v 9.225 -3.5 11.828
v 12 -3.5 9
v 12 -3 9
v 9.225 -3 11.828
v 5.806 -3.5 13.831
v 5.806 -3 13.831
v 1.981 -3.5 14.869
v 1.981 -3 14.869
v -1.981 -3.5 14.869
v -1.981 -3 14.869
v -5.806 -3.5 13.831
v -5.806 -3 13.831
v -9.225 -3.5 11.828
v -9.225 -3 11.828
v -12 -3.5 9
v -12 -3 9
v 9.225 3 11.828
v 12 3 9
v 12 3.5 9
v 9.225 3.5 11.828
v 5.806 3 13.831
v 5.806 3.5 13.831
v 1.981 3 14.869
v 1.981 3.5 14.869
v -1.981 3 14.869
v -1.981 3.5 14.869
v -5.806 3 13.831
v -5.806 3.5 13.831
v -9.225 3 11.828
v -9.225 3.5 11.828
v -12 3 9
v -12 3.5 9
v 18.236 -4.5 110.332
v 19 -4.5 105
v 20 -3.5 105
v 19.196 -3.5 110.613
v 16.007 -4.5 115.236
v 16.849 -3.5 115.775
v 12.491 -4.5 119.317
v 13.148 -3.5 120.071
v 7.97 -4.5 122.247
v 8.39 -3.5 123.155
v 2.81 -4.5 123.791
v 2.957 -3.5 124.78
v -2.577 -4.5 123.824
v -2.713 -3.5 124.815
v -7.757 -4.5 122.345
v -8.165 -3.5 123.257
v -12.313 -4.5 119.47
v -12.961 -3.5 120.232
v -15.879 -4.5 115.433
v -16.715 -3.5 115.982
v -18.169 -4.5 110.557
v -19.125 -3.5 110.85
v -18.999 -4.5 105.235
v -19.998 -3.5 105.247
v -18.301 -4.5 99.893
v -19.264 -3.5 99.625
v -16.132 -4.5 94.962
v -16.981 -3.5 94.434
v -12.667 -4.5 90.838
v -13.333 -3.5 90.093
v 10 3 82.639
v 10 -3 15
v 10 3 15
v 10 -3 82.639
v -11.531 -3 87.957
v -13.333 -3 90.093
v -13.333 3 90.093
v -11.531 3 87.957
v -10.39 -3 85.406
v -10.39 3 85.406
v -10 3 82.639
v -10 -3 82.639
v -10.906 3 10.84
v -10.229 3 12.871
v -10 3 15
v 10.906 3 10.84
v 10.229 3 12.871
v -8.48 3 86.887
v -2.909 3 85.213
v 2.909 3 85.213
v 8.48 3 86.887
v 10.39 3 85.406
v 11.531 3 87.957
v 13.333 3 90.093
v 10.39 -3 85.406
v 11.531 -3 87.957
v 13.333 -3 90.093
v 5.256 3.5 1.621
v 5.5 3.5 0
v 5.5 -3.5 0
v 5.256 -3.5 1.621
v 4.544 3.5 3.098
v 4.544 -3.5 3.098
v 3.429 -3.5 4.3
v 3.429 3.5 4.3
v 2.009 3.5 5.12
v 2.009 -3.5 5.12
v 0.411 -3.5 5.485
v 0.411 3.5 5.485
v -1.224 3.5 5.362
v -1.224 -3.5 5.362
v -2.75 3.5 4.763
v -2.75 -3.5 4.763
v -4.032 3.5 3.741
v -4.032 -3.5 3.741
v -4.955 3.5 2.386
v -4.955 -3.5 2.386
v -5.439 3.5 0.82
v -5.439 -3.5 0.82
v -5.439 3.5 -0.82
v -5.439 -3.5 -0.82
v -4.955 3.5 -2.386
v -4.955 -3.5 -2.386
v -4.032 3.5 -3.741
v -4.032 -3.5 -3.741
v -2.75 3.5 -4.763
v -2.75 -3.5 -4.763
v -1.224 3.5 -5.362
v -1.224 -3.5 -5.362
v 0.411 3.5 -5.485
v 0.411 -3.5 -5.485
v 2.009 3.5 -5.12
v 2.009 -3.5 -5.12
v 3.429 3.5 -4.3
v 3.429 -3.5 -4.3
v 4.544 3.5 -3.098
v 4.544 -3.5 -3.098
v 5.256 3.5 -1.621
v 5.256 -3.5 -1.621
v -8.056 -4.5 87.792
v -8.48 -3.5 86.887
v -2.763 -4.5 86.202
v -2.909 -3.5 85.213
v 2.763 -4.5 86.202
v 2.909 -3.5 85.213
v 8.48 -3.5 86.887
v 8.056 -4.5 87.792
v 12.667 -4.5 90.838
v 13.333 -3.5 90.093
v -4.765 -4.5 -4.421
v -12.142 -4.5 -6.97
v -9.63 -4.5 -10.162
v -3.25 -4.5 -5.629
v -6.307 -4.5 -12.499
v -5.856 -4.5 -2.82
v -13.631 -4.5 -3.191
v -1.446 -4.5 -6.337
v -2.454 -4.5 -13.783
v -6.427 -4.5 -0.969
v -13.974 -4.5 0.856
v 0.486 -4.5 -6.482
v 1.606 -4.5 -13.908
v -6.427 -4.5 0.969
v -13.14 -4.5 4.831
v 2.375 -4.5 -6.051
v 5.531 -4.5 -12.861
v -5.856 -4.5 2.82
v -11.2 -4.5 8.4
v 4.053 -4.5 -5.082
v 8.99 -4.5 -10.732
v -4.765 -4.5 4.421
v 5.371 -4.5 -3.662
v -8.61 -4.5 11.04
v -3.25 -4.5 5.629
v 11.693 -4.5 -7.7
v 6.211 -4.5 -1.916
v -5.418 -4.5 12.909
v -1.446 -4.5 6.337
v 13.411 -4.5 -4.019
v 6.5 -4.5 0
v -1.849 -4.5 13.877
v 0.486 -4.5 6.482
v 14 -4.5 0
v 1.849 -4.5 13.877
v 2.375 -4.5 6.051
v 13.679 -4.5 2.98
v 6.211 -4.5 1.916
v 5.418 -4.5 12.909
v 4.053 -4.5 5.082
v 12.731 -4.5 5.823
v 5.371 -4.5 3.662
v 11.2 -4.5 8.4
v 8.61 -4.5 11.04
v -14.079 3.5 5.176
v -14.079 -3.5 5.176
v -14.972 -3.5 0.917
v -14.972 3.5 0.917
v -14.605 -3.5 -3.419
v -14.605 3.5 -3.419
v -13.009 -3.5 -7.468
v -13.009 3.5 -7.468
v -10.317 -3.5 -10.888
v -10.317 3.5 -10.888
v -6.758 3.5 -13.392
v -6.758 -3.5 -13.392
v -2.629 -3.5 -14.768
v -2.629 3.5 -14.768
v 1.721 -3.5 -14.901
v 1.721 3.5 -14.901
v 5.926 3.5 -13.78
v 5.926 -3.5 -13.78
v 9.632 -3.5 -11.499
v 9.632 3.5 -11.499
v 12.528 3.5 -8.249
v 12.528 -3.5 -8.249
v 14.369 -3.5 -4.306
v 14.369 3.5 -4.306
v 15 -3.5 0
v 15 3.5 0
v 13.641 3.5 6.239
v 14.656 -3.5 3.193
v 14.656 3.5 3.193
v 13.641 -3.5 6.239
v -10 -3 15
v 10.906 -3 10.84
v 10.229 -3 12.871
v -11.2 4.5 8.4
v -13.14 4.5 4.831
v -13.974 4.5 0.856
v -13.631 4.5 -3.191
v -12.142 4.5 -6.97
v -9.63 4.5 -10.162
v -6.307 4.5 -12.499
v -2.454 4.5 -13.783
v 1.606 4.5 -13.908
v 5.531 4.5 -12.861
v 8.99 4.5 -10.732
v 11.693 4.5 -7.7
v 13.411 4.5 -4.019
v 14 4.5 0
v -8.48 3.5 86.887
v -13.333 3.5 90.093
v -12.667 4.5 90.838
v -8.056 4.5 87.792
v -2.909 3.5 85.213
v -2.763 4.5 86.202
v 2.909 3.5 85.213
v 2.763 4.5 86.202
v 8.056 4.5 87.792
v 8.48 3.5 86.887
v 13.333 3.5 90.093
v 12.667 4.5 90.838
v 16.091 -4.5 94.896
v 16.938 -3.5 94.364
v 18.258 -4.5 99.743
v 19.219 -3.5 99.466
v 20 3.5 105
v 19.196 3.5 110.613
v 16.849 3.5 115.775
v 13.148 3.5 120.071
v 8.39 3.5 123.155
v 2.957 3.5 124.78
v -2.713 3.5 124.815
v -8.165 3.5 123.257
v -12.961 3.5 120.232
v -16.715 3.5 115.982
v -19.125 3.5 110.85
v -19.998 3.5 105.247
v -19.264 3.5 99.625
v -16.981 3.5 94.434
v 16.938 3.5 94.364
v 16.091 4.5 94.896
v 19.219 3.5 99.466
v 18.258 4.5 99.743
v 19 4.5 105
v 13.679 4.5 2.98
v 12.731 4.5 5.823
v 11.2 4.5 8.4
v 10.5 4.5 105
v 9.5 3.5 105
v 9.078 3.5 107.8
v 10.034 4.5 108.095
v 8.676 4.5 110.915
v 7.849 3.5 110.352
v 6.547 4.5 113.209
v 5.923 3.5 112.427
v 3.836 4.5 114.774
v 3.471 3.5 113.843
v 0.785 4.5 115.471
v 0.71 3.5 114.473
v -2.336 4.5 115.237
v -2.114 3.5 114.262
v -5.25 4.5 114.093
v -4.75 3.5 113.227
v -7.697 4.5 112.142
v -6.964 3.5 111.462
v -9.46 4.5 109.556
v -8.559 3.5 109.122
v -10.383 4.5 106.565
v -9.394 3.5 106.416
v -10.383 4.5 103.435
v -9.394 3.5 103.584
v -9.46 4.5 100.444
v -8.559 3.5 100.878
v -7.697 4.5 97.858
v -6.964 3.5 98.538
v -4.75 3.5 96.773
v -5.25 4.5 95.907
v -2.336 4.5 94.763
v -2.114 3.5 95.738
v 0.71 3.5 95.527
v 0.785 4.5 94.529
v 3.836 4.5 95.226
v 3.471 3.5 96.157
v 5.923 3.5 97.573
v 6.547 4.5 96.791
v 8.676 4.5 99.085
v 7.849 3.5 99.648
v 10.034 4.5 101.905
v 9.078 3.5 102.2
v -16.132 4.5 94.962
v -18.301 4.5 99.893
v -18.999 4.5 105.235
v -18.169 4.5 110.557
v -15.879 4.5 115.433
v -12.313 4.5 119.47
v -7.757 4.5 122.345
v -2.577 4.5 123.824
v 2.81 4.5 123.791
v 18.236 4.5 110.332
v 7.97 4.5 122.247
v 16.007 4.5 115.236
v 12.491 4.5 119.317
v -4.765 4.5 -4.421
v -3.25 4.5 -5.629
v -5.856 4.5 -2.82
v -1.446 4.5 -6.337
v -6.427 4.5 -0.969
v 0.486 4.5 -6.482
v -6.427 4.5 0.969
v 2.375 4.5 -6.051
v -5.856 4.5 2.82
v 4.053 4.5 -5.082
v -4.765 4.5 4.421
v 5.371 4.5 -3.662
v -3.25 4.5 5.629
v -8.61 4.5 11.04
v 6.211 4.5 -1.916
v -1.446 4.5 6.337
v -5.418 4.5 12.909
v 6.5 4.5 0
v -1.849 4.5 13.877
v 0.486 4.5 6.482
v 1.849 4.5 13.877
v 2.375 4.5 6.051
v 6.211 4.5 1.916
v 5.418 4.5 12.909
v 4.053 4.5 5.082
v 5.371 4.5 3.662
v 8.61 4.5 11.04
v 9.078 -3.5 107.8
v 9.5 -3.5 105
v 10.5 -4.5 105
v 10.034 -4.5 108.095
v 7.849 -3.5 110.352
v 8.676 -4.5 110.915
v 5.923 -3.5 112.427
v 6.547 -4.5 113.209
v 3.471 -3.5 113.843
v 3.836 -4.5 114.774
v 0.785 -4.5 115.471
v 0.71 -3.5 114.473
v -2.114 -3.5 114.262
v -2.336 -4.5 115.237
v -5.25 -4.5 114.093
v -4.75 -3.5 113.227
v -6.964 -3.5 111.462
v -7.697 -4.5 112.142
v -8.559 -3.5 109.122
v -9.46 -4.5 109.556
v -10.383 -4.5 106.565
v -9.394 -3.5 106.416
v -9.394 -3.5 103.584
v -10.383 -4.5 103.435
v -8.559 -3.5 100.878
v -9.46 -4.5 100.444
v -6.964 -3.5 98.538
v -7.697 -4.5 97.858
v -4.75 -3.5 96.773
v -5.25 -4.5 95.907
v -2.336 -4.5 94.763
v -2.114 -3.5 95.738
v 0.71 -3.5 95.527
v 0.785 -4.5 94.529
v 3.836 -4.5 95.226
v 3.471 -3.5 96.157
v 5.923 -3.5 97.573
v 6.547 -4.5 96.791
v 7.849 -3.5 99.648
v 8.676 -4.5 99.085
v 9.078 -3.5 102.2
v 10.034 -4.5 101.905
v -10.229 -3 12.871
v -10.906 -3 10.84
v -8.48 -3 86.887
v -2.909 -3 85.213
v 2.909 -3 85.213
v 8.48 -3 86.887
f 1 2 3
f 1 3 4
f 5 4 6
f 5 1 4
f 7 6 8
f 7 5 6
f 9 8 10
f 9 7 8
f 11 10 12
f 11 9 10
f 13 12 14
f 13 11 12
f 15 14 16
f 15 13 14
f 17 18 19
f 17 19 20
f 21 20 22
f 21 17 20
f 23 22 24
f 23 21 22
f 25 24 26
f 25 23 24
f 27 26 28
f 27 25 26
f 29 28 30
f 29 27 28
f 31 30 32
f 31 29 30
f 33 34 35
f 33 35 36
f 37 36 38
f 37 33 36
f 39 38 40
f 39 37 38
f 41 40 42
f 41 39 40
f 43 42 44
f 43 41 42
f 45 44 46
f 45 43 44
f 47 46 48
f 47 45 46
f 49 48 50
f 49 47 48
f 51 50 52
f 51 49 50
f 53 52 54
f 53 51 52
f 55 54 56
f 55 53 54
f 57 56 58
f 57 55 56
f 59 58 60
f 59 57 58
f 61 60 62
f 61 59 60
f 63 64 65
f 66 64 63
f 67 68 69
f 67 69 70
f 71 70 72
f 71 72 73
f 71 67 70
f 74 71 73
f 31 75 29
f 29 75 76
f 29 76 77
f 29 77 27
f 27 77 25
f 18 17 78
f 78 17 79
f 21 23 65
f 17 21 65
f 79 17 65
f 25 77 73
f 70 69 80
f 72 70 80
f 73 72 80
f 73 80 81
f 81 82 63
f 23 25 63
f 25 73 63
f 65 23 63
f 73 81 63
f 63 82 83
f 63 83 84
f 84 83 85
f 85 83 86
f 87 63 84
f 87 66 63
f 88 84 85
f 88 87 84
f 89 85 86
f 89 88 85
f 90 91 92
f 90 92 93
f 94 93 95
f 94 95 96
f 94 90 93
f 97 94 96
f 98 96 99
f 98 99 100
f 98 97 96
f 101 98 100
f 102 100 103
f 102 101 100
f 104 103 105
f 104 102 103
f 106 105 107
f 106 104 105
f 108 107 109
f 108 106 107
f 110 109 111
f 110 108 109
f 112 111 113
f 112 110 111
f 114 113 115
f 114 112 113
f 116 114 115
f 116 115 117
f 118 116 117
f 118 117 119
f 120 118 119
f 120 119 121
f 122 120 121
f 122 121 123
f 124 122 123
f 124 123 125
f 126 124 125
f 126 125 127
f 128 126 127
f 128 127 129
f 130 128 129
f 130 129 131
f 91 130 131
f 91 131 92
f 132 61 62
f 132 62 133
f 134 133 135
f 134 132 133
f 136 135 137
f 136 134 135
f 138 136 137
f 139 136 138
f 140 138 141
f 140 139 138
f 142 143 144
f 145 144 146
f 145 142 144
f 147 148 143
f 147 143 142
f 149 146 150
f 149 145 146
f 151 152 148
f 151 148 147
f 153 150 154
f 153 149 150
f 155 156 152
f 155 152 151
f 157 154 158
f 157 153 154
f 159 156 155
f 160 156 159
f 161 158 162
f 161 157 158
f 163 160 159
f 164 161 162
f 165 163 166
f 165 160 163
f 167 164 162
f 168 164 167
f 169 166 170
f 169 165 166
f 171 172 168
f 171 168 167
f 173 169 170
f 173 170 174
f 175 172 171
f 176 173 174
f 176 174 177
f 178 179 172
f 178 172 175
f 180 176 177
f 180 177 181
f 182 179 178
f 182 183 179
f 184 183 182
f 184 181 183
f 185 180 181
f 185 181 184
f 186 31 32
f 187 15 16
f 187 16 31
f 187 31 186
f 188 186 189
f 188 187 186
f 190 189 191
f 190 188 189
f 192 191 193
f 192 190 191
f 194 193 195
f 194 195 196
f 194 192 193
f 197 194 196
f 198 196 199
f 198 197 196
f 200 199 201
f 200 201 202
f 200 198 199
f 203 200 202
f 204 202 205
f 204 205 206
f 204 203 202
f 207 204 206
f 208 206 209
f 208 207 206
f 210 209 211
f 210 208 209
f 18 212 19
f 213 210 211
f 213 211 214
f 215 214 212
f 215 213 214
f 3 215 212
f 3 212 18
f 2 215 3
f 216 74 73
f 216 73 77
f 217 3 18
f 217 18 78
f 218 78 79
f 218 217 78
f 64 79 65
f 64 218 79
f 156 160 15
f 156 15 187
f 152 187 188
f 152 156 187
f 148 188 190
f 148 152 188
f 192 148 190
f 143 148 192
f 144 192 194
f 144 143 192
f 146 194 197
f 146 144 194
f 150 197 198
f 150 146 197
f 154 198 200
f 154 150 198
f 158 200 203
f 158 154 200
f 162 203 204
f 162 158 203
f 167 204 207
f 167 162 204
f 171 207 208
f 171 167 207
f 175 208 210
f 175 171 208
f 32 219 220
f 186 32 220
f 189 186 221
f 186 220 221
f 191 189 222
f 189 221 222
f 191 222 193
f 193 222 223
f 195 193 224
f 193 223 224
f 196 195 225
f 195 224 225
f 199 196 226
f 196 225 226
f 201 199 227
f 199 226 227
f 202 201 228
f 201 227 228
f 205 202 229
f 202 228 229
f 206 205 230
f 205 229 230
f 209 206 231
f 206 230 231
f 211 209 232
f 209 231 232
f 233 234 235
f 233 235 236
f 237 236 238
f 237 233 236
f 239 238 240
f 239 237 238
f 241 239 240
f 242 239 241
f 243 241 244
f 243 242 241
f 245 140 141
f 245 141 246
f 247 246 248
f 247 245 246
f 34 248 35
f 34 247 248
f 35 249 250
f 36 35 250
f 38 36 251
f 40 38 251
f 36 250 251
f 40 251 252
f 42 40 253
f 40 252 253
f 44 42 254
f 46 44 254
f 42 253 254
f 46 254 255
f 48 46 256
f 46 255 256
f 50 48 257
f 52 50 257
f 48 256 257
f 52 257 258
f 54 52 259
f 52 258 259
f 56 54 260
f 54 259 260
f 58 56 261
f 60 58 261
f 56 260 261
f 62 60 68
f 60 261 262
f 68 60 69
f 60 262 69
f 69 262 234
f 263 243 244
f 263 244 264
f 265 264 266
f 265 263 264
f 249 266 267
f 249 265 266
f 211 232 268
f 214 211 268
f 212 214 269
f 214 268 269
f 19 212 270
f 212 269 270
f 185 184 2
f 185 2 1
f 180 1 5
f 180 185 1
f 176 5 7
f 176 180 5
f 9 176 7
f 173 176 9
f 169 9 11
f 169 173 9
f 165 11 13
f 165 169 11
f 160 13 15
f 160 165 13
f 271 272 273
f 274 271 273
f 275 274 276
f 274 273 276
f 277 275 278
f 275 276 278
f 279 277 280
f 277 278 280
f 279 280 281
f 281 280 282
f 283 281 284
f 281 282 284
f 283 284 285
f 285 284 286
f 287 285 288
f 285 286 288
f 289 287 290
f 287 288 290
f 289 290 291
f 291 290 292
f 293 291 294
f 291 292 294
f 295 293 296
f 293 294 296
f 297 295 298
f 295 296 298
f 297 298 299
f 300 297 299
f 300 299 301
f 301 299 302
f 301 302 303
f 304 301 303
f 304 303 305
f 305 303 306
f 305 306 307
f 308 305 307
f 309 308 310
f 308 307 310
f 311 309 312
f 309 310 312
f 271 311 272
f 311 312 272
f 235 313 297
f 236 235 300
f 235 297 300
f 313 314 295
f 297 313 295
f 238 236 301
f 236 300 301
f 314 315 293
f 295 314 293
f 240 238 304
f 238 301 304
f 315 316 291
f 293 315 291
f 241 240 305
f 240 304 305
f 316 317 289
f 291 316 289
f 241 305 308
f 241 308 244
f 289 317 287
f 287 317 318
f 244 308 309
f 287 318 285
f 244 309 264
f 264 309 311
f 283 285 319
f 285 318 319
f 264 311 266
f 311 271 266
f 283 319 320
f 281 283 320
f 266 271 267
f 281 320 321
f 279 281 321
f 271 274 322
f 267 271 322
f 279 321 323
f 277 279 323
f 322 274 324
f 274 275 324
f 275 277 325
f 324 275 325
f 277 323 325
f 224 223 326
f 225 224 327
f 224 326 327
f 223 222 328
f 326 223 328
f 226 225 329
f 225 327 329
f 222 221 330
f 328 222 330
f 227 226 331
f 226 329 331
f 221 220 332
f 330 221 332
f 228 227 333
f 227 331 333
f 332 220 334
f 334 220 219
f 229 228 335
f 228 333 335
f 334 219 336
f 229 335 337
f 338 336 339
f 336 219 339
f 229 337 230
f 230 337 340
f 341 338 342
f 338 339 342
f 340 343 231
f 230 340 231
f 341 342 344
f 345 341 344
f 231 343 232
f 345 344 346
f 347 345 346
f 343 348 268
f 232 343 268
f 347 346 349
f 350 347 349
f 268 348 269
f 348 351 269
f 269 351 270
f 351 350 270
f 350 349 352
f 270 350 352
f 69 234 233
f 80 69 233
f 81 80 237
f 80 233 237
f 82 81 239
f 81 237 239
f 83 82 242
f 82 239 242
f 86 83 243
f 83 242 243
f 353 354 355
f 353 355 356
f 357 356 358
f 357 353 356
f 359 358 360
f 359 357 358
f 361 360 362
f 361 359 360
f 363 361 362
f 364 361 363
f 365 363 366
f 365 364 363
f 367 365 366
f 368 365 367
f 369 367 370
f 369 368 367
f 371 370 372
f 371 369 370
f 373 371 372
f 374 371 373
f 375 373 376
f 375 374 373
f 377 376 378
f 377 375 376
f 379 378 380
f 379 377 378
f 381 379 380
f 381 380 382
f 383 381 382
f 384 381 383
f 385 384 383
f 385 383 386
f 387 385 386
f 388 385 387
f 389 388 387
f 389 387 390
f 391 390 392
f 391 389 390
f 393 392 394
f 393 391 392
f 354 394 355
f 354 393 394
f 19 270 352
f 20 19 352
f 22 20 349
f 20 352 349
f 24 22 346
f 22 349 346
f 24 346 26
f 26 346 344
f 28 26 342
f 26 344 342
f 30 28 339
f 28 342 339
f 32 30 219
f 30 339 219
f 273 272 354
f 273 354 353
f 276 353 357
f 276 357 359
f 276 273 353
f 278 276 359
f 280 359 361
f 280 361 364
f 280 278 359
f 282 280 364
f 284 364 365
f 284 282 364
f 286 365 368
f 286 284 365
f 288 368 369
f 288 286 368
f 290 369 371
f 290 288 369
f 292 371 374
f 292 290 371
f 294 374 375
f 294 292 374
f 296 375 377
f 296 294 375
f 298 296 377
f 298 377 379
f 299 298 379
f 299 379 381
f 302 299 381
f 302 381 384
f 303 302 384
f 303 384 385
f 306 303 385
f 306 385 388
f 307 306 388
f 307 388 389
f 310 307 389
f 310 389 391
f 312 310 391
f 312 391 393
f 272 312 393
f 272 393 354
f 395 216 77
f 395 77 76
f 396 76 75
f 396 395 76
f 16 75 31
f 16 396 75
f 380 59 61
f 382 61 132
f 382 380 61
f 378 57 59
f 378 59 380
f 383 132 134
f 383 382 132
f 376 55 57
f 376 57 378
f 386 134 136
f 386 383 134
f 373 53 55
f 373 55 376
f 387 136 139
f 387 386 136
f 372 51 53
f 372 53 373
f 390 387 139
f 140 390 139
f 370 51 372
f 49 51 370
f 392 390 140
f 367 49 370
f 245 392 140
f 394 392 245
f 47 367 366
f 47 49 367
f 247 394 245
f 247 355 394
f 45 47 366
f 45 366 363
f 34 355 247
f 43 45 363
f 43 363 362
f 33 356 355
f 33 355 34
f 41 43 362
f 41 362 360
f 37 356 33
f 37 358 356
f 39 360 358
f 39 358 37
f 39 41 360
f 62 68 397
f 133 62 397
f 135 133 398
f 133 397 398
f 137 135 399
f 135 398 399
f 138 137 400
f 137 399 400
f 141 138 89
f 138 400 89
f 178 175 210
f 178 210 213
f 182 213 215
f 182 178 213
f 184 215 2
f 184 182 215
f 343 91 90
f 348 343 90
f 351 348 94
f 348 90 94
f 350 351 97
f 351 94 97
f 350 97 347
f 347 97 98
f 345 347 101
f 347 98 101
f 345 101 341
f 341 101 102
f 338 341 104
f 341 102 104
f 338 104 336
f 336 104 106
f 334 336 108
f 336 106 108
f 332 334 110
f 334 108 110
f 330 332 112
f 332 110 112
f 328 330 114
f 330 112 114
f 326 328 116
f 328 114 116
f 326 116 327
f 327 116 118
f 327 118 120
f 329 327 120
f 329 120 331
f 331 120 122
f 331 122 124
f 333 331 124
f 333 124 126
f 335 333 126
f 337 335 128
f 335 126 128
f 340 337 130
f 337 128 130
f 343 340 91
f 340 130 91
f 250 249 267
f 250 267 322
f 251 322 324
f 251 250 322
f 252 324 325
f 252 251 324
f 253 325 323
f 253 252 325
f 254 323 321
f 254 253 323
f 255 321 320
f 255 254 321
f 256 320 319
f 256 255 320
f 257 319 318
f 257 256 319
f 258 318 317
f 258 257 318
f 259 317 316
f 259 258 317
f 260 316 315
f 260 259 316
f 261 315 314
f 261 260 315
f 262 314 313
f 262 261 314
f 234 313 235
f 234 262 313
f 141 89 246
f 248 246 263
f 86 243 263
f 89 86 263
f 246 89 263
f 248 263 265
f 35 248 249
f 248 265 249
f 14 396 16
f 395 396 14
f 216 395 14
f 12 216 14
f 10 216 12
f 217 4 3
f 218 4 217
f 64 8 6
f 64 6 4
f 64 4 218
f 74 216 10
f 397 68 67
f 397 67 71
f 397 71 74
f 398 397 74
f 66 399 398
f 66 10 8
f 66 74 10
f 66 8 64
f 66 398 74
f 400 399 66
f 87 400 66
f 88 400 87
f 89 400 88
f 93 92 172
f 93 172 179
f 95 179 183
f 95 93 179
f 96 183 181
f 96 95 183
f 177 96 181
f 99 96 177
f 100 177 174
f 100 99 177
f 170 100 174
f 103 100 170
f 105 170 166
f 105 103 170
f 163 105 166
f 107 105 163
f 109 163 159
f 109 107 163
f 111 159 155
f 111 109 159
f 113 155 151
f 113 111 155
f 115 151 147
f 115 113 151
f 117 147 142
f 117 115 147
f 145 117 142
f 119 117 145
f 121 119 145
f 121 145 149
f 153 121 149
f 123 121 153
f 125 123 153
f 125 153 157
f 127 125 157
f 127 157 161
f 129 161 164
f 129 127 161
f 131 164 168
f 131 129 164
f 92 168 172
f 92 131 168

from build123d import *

# Parameters (mm, degrees)
F1_DEPTH = 3
F0_R     = 9.5
F0_R_2   = 5.5
F2_DEPTH = 4.5
F3_SIZE  = 1


with BuildPart() as f1:
    # F0 (on Front) → F1 (new body, symmetric)
    with BuildSketch(Plane.XZ):
        with BuildLine():
            ThreePointArc((13.333333, 90.09288), (0, 85), (-13.333333, 90.09288))
            ThreePointArc((-13.333333, 90.09288), (-10.871291, 86.721803), (-10, 82.63932))
            Line((-10, 82.63932), (-10, 15))
            ThreePointArc((-10, 15), (-10.513167, 11.837722), (-12, 9))
            ThreePointArc((-12, 9), (0, 15), (12, 9))
            ThreePointArc((12, 9), (10.513167, 11.837722), (10, 15))
            Line((10, 15), (10, 82.63932))
            ThreePointArc((10, 82.63932), (10.871291, 86.721803), (13.333333, 90.09288))
        make_face()
    extrude(amount=F1_DEPTH, both=True)

    # F0 (on Front) → F2 (join, symmetric)
    with BuildSketch(Plane.XZ):
        with BuildLine():
            ThreePointArc((13.333333, 90.09288), (18.257419, 96.835034), (20, 105))
            ThreePointArc((20, 105), (-8.164966, 123.257419), (-13.333333, 90.09288))
            ThreePointArc((-13.333333, 90.09288), (0, 85), (13.333333, 90.09288))
        make_face()
        with Locations((0, 105)):
            Circle(F0_R, mode=Mode.SUBTRACT)
        with BuildLine():
            ThreePointArc((12, 9), (0, 15), (-12, 9))
            ThreePointArc((-12, 9), (-4.743416, -14.230249), (15, 0))
            ThreePointArc((15, 0), (14.230249, 4.743416), (12, 9))
        make_face()
        Circle(F0_R_2, mode=Mode.SUBTRACT)
    extrude(amount=F2_DEPTH, both=True)

    # F3
    f3_edges = [f1.edges().sort_by_distance(p)[0] for p in [
        (18.257419, -4.5, 96.835034),
        (-8.164966, -4.5, 123.257419),
        (0, -4.5, 85),
        (-9.5, -4.5, 105),
        (14.230249, -4.5, 4.743416),
        (0, -4.5, 15),
        (-4.743416, -4.5, -14.230249),
        (-5.5, -4.5, 0),
        (-4.743416, 4.5, -14.230249),
        (-5.5, 4.5, 0),
        (18.257419, 4.5, 96.835034),
        (-8.164966, 4.5, 123.257419),
        (0, 4.5, 85),
        (-9.5, 4.5, 105),
    ]]
    chamfer(f3_edges, length=F3_SIZE)


solid = f1.part
